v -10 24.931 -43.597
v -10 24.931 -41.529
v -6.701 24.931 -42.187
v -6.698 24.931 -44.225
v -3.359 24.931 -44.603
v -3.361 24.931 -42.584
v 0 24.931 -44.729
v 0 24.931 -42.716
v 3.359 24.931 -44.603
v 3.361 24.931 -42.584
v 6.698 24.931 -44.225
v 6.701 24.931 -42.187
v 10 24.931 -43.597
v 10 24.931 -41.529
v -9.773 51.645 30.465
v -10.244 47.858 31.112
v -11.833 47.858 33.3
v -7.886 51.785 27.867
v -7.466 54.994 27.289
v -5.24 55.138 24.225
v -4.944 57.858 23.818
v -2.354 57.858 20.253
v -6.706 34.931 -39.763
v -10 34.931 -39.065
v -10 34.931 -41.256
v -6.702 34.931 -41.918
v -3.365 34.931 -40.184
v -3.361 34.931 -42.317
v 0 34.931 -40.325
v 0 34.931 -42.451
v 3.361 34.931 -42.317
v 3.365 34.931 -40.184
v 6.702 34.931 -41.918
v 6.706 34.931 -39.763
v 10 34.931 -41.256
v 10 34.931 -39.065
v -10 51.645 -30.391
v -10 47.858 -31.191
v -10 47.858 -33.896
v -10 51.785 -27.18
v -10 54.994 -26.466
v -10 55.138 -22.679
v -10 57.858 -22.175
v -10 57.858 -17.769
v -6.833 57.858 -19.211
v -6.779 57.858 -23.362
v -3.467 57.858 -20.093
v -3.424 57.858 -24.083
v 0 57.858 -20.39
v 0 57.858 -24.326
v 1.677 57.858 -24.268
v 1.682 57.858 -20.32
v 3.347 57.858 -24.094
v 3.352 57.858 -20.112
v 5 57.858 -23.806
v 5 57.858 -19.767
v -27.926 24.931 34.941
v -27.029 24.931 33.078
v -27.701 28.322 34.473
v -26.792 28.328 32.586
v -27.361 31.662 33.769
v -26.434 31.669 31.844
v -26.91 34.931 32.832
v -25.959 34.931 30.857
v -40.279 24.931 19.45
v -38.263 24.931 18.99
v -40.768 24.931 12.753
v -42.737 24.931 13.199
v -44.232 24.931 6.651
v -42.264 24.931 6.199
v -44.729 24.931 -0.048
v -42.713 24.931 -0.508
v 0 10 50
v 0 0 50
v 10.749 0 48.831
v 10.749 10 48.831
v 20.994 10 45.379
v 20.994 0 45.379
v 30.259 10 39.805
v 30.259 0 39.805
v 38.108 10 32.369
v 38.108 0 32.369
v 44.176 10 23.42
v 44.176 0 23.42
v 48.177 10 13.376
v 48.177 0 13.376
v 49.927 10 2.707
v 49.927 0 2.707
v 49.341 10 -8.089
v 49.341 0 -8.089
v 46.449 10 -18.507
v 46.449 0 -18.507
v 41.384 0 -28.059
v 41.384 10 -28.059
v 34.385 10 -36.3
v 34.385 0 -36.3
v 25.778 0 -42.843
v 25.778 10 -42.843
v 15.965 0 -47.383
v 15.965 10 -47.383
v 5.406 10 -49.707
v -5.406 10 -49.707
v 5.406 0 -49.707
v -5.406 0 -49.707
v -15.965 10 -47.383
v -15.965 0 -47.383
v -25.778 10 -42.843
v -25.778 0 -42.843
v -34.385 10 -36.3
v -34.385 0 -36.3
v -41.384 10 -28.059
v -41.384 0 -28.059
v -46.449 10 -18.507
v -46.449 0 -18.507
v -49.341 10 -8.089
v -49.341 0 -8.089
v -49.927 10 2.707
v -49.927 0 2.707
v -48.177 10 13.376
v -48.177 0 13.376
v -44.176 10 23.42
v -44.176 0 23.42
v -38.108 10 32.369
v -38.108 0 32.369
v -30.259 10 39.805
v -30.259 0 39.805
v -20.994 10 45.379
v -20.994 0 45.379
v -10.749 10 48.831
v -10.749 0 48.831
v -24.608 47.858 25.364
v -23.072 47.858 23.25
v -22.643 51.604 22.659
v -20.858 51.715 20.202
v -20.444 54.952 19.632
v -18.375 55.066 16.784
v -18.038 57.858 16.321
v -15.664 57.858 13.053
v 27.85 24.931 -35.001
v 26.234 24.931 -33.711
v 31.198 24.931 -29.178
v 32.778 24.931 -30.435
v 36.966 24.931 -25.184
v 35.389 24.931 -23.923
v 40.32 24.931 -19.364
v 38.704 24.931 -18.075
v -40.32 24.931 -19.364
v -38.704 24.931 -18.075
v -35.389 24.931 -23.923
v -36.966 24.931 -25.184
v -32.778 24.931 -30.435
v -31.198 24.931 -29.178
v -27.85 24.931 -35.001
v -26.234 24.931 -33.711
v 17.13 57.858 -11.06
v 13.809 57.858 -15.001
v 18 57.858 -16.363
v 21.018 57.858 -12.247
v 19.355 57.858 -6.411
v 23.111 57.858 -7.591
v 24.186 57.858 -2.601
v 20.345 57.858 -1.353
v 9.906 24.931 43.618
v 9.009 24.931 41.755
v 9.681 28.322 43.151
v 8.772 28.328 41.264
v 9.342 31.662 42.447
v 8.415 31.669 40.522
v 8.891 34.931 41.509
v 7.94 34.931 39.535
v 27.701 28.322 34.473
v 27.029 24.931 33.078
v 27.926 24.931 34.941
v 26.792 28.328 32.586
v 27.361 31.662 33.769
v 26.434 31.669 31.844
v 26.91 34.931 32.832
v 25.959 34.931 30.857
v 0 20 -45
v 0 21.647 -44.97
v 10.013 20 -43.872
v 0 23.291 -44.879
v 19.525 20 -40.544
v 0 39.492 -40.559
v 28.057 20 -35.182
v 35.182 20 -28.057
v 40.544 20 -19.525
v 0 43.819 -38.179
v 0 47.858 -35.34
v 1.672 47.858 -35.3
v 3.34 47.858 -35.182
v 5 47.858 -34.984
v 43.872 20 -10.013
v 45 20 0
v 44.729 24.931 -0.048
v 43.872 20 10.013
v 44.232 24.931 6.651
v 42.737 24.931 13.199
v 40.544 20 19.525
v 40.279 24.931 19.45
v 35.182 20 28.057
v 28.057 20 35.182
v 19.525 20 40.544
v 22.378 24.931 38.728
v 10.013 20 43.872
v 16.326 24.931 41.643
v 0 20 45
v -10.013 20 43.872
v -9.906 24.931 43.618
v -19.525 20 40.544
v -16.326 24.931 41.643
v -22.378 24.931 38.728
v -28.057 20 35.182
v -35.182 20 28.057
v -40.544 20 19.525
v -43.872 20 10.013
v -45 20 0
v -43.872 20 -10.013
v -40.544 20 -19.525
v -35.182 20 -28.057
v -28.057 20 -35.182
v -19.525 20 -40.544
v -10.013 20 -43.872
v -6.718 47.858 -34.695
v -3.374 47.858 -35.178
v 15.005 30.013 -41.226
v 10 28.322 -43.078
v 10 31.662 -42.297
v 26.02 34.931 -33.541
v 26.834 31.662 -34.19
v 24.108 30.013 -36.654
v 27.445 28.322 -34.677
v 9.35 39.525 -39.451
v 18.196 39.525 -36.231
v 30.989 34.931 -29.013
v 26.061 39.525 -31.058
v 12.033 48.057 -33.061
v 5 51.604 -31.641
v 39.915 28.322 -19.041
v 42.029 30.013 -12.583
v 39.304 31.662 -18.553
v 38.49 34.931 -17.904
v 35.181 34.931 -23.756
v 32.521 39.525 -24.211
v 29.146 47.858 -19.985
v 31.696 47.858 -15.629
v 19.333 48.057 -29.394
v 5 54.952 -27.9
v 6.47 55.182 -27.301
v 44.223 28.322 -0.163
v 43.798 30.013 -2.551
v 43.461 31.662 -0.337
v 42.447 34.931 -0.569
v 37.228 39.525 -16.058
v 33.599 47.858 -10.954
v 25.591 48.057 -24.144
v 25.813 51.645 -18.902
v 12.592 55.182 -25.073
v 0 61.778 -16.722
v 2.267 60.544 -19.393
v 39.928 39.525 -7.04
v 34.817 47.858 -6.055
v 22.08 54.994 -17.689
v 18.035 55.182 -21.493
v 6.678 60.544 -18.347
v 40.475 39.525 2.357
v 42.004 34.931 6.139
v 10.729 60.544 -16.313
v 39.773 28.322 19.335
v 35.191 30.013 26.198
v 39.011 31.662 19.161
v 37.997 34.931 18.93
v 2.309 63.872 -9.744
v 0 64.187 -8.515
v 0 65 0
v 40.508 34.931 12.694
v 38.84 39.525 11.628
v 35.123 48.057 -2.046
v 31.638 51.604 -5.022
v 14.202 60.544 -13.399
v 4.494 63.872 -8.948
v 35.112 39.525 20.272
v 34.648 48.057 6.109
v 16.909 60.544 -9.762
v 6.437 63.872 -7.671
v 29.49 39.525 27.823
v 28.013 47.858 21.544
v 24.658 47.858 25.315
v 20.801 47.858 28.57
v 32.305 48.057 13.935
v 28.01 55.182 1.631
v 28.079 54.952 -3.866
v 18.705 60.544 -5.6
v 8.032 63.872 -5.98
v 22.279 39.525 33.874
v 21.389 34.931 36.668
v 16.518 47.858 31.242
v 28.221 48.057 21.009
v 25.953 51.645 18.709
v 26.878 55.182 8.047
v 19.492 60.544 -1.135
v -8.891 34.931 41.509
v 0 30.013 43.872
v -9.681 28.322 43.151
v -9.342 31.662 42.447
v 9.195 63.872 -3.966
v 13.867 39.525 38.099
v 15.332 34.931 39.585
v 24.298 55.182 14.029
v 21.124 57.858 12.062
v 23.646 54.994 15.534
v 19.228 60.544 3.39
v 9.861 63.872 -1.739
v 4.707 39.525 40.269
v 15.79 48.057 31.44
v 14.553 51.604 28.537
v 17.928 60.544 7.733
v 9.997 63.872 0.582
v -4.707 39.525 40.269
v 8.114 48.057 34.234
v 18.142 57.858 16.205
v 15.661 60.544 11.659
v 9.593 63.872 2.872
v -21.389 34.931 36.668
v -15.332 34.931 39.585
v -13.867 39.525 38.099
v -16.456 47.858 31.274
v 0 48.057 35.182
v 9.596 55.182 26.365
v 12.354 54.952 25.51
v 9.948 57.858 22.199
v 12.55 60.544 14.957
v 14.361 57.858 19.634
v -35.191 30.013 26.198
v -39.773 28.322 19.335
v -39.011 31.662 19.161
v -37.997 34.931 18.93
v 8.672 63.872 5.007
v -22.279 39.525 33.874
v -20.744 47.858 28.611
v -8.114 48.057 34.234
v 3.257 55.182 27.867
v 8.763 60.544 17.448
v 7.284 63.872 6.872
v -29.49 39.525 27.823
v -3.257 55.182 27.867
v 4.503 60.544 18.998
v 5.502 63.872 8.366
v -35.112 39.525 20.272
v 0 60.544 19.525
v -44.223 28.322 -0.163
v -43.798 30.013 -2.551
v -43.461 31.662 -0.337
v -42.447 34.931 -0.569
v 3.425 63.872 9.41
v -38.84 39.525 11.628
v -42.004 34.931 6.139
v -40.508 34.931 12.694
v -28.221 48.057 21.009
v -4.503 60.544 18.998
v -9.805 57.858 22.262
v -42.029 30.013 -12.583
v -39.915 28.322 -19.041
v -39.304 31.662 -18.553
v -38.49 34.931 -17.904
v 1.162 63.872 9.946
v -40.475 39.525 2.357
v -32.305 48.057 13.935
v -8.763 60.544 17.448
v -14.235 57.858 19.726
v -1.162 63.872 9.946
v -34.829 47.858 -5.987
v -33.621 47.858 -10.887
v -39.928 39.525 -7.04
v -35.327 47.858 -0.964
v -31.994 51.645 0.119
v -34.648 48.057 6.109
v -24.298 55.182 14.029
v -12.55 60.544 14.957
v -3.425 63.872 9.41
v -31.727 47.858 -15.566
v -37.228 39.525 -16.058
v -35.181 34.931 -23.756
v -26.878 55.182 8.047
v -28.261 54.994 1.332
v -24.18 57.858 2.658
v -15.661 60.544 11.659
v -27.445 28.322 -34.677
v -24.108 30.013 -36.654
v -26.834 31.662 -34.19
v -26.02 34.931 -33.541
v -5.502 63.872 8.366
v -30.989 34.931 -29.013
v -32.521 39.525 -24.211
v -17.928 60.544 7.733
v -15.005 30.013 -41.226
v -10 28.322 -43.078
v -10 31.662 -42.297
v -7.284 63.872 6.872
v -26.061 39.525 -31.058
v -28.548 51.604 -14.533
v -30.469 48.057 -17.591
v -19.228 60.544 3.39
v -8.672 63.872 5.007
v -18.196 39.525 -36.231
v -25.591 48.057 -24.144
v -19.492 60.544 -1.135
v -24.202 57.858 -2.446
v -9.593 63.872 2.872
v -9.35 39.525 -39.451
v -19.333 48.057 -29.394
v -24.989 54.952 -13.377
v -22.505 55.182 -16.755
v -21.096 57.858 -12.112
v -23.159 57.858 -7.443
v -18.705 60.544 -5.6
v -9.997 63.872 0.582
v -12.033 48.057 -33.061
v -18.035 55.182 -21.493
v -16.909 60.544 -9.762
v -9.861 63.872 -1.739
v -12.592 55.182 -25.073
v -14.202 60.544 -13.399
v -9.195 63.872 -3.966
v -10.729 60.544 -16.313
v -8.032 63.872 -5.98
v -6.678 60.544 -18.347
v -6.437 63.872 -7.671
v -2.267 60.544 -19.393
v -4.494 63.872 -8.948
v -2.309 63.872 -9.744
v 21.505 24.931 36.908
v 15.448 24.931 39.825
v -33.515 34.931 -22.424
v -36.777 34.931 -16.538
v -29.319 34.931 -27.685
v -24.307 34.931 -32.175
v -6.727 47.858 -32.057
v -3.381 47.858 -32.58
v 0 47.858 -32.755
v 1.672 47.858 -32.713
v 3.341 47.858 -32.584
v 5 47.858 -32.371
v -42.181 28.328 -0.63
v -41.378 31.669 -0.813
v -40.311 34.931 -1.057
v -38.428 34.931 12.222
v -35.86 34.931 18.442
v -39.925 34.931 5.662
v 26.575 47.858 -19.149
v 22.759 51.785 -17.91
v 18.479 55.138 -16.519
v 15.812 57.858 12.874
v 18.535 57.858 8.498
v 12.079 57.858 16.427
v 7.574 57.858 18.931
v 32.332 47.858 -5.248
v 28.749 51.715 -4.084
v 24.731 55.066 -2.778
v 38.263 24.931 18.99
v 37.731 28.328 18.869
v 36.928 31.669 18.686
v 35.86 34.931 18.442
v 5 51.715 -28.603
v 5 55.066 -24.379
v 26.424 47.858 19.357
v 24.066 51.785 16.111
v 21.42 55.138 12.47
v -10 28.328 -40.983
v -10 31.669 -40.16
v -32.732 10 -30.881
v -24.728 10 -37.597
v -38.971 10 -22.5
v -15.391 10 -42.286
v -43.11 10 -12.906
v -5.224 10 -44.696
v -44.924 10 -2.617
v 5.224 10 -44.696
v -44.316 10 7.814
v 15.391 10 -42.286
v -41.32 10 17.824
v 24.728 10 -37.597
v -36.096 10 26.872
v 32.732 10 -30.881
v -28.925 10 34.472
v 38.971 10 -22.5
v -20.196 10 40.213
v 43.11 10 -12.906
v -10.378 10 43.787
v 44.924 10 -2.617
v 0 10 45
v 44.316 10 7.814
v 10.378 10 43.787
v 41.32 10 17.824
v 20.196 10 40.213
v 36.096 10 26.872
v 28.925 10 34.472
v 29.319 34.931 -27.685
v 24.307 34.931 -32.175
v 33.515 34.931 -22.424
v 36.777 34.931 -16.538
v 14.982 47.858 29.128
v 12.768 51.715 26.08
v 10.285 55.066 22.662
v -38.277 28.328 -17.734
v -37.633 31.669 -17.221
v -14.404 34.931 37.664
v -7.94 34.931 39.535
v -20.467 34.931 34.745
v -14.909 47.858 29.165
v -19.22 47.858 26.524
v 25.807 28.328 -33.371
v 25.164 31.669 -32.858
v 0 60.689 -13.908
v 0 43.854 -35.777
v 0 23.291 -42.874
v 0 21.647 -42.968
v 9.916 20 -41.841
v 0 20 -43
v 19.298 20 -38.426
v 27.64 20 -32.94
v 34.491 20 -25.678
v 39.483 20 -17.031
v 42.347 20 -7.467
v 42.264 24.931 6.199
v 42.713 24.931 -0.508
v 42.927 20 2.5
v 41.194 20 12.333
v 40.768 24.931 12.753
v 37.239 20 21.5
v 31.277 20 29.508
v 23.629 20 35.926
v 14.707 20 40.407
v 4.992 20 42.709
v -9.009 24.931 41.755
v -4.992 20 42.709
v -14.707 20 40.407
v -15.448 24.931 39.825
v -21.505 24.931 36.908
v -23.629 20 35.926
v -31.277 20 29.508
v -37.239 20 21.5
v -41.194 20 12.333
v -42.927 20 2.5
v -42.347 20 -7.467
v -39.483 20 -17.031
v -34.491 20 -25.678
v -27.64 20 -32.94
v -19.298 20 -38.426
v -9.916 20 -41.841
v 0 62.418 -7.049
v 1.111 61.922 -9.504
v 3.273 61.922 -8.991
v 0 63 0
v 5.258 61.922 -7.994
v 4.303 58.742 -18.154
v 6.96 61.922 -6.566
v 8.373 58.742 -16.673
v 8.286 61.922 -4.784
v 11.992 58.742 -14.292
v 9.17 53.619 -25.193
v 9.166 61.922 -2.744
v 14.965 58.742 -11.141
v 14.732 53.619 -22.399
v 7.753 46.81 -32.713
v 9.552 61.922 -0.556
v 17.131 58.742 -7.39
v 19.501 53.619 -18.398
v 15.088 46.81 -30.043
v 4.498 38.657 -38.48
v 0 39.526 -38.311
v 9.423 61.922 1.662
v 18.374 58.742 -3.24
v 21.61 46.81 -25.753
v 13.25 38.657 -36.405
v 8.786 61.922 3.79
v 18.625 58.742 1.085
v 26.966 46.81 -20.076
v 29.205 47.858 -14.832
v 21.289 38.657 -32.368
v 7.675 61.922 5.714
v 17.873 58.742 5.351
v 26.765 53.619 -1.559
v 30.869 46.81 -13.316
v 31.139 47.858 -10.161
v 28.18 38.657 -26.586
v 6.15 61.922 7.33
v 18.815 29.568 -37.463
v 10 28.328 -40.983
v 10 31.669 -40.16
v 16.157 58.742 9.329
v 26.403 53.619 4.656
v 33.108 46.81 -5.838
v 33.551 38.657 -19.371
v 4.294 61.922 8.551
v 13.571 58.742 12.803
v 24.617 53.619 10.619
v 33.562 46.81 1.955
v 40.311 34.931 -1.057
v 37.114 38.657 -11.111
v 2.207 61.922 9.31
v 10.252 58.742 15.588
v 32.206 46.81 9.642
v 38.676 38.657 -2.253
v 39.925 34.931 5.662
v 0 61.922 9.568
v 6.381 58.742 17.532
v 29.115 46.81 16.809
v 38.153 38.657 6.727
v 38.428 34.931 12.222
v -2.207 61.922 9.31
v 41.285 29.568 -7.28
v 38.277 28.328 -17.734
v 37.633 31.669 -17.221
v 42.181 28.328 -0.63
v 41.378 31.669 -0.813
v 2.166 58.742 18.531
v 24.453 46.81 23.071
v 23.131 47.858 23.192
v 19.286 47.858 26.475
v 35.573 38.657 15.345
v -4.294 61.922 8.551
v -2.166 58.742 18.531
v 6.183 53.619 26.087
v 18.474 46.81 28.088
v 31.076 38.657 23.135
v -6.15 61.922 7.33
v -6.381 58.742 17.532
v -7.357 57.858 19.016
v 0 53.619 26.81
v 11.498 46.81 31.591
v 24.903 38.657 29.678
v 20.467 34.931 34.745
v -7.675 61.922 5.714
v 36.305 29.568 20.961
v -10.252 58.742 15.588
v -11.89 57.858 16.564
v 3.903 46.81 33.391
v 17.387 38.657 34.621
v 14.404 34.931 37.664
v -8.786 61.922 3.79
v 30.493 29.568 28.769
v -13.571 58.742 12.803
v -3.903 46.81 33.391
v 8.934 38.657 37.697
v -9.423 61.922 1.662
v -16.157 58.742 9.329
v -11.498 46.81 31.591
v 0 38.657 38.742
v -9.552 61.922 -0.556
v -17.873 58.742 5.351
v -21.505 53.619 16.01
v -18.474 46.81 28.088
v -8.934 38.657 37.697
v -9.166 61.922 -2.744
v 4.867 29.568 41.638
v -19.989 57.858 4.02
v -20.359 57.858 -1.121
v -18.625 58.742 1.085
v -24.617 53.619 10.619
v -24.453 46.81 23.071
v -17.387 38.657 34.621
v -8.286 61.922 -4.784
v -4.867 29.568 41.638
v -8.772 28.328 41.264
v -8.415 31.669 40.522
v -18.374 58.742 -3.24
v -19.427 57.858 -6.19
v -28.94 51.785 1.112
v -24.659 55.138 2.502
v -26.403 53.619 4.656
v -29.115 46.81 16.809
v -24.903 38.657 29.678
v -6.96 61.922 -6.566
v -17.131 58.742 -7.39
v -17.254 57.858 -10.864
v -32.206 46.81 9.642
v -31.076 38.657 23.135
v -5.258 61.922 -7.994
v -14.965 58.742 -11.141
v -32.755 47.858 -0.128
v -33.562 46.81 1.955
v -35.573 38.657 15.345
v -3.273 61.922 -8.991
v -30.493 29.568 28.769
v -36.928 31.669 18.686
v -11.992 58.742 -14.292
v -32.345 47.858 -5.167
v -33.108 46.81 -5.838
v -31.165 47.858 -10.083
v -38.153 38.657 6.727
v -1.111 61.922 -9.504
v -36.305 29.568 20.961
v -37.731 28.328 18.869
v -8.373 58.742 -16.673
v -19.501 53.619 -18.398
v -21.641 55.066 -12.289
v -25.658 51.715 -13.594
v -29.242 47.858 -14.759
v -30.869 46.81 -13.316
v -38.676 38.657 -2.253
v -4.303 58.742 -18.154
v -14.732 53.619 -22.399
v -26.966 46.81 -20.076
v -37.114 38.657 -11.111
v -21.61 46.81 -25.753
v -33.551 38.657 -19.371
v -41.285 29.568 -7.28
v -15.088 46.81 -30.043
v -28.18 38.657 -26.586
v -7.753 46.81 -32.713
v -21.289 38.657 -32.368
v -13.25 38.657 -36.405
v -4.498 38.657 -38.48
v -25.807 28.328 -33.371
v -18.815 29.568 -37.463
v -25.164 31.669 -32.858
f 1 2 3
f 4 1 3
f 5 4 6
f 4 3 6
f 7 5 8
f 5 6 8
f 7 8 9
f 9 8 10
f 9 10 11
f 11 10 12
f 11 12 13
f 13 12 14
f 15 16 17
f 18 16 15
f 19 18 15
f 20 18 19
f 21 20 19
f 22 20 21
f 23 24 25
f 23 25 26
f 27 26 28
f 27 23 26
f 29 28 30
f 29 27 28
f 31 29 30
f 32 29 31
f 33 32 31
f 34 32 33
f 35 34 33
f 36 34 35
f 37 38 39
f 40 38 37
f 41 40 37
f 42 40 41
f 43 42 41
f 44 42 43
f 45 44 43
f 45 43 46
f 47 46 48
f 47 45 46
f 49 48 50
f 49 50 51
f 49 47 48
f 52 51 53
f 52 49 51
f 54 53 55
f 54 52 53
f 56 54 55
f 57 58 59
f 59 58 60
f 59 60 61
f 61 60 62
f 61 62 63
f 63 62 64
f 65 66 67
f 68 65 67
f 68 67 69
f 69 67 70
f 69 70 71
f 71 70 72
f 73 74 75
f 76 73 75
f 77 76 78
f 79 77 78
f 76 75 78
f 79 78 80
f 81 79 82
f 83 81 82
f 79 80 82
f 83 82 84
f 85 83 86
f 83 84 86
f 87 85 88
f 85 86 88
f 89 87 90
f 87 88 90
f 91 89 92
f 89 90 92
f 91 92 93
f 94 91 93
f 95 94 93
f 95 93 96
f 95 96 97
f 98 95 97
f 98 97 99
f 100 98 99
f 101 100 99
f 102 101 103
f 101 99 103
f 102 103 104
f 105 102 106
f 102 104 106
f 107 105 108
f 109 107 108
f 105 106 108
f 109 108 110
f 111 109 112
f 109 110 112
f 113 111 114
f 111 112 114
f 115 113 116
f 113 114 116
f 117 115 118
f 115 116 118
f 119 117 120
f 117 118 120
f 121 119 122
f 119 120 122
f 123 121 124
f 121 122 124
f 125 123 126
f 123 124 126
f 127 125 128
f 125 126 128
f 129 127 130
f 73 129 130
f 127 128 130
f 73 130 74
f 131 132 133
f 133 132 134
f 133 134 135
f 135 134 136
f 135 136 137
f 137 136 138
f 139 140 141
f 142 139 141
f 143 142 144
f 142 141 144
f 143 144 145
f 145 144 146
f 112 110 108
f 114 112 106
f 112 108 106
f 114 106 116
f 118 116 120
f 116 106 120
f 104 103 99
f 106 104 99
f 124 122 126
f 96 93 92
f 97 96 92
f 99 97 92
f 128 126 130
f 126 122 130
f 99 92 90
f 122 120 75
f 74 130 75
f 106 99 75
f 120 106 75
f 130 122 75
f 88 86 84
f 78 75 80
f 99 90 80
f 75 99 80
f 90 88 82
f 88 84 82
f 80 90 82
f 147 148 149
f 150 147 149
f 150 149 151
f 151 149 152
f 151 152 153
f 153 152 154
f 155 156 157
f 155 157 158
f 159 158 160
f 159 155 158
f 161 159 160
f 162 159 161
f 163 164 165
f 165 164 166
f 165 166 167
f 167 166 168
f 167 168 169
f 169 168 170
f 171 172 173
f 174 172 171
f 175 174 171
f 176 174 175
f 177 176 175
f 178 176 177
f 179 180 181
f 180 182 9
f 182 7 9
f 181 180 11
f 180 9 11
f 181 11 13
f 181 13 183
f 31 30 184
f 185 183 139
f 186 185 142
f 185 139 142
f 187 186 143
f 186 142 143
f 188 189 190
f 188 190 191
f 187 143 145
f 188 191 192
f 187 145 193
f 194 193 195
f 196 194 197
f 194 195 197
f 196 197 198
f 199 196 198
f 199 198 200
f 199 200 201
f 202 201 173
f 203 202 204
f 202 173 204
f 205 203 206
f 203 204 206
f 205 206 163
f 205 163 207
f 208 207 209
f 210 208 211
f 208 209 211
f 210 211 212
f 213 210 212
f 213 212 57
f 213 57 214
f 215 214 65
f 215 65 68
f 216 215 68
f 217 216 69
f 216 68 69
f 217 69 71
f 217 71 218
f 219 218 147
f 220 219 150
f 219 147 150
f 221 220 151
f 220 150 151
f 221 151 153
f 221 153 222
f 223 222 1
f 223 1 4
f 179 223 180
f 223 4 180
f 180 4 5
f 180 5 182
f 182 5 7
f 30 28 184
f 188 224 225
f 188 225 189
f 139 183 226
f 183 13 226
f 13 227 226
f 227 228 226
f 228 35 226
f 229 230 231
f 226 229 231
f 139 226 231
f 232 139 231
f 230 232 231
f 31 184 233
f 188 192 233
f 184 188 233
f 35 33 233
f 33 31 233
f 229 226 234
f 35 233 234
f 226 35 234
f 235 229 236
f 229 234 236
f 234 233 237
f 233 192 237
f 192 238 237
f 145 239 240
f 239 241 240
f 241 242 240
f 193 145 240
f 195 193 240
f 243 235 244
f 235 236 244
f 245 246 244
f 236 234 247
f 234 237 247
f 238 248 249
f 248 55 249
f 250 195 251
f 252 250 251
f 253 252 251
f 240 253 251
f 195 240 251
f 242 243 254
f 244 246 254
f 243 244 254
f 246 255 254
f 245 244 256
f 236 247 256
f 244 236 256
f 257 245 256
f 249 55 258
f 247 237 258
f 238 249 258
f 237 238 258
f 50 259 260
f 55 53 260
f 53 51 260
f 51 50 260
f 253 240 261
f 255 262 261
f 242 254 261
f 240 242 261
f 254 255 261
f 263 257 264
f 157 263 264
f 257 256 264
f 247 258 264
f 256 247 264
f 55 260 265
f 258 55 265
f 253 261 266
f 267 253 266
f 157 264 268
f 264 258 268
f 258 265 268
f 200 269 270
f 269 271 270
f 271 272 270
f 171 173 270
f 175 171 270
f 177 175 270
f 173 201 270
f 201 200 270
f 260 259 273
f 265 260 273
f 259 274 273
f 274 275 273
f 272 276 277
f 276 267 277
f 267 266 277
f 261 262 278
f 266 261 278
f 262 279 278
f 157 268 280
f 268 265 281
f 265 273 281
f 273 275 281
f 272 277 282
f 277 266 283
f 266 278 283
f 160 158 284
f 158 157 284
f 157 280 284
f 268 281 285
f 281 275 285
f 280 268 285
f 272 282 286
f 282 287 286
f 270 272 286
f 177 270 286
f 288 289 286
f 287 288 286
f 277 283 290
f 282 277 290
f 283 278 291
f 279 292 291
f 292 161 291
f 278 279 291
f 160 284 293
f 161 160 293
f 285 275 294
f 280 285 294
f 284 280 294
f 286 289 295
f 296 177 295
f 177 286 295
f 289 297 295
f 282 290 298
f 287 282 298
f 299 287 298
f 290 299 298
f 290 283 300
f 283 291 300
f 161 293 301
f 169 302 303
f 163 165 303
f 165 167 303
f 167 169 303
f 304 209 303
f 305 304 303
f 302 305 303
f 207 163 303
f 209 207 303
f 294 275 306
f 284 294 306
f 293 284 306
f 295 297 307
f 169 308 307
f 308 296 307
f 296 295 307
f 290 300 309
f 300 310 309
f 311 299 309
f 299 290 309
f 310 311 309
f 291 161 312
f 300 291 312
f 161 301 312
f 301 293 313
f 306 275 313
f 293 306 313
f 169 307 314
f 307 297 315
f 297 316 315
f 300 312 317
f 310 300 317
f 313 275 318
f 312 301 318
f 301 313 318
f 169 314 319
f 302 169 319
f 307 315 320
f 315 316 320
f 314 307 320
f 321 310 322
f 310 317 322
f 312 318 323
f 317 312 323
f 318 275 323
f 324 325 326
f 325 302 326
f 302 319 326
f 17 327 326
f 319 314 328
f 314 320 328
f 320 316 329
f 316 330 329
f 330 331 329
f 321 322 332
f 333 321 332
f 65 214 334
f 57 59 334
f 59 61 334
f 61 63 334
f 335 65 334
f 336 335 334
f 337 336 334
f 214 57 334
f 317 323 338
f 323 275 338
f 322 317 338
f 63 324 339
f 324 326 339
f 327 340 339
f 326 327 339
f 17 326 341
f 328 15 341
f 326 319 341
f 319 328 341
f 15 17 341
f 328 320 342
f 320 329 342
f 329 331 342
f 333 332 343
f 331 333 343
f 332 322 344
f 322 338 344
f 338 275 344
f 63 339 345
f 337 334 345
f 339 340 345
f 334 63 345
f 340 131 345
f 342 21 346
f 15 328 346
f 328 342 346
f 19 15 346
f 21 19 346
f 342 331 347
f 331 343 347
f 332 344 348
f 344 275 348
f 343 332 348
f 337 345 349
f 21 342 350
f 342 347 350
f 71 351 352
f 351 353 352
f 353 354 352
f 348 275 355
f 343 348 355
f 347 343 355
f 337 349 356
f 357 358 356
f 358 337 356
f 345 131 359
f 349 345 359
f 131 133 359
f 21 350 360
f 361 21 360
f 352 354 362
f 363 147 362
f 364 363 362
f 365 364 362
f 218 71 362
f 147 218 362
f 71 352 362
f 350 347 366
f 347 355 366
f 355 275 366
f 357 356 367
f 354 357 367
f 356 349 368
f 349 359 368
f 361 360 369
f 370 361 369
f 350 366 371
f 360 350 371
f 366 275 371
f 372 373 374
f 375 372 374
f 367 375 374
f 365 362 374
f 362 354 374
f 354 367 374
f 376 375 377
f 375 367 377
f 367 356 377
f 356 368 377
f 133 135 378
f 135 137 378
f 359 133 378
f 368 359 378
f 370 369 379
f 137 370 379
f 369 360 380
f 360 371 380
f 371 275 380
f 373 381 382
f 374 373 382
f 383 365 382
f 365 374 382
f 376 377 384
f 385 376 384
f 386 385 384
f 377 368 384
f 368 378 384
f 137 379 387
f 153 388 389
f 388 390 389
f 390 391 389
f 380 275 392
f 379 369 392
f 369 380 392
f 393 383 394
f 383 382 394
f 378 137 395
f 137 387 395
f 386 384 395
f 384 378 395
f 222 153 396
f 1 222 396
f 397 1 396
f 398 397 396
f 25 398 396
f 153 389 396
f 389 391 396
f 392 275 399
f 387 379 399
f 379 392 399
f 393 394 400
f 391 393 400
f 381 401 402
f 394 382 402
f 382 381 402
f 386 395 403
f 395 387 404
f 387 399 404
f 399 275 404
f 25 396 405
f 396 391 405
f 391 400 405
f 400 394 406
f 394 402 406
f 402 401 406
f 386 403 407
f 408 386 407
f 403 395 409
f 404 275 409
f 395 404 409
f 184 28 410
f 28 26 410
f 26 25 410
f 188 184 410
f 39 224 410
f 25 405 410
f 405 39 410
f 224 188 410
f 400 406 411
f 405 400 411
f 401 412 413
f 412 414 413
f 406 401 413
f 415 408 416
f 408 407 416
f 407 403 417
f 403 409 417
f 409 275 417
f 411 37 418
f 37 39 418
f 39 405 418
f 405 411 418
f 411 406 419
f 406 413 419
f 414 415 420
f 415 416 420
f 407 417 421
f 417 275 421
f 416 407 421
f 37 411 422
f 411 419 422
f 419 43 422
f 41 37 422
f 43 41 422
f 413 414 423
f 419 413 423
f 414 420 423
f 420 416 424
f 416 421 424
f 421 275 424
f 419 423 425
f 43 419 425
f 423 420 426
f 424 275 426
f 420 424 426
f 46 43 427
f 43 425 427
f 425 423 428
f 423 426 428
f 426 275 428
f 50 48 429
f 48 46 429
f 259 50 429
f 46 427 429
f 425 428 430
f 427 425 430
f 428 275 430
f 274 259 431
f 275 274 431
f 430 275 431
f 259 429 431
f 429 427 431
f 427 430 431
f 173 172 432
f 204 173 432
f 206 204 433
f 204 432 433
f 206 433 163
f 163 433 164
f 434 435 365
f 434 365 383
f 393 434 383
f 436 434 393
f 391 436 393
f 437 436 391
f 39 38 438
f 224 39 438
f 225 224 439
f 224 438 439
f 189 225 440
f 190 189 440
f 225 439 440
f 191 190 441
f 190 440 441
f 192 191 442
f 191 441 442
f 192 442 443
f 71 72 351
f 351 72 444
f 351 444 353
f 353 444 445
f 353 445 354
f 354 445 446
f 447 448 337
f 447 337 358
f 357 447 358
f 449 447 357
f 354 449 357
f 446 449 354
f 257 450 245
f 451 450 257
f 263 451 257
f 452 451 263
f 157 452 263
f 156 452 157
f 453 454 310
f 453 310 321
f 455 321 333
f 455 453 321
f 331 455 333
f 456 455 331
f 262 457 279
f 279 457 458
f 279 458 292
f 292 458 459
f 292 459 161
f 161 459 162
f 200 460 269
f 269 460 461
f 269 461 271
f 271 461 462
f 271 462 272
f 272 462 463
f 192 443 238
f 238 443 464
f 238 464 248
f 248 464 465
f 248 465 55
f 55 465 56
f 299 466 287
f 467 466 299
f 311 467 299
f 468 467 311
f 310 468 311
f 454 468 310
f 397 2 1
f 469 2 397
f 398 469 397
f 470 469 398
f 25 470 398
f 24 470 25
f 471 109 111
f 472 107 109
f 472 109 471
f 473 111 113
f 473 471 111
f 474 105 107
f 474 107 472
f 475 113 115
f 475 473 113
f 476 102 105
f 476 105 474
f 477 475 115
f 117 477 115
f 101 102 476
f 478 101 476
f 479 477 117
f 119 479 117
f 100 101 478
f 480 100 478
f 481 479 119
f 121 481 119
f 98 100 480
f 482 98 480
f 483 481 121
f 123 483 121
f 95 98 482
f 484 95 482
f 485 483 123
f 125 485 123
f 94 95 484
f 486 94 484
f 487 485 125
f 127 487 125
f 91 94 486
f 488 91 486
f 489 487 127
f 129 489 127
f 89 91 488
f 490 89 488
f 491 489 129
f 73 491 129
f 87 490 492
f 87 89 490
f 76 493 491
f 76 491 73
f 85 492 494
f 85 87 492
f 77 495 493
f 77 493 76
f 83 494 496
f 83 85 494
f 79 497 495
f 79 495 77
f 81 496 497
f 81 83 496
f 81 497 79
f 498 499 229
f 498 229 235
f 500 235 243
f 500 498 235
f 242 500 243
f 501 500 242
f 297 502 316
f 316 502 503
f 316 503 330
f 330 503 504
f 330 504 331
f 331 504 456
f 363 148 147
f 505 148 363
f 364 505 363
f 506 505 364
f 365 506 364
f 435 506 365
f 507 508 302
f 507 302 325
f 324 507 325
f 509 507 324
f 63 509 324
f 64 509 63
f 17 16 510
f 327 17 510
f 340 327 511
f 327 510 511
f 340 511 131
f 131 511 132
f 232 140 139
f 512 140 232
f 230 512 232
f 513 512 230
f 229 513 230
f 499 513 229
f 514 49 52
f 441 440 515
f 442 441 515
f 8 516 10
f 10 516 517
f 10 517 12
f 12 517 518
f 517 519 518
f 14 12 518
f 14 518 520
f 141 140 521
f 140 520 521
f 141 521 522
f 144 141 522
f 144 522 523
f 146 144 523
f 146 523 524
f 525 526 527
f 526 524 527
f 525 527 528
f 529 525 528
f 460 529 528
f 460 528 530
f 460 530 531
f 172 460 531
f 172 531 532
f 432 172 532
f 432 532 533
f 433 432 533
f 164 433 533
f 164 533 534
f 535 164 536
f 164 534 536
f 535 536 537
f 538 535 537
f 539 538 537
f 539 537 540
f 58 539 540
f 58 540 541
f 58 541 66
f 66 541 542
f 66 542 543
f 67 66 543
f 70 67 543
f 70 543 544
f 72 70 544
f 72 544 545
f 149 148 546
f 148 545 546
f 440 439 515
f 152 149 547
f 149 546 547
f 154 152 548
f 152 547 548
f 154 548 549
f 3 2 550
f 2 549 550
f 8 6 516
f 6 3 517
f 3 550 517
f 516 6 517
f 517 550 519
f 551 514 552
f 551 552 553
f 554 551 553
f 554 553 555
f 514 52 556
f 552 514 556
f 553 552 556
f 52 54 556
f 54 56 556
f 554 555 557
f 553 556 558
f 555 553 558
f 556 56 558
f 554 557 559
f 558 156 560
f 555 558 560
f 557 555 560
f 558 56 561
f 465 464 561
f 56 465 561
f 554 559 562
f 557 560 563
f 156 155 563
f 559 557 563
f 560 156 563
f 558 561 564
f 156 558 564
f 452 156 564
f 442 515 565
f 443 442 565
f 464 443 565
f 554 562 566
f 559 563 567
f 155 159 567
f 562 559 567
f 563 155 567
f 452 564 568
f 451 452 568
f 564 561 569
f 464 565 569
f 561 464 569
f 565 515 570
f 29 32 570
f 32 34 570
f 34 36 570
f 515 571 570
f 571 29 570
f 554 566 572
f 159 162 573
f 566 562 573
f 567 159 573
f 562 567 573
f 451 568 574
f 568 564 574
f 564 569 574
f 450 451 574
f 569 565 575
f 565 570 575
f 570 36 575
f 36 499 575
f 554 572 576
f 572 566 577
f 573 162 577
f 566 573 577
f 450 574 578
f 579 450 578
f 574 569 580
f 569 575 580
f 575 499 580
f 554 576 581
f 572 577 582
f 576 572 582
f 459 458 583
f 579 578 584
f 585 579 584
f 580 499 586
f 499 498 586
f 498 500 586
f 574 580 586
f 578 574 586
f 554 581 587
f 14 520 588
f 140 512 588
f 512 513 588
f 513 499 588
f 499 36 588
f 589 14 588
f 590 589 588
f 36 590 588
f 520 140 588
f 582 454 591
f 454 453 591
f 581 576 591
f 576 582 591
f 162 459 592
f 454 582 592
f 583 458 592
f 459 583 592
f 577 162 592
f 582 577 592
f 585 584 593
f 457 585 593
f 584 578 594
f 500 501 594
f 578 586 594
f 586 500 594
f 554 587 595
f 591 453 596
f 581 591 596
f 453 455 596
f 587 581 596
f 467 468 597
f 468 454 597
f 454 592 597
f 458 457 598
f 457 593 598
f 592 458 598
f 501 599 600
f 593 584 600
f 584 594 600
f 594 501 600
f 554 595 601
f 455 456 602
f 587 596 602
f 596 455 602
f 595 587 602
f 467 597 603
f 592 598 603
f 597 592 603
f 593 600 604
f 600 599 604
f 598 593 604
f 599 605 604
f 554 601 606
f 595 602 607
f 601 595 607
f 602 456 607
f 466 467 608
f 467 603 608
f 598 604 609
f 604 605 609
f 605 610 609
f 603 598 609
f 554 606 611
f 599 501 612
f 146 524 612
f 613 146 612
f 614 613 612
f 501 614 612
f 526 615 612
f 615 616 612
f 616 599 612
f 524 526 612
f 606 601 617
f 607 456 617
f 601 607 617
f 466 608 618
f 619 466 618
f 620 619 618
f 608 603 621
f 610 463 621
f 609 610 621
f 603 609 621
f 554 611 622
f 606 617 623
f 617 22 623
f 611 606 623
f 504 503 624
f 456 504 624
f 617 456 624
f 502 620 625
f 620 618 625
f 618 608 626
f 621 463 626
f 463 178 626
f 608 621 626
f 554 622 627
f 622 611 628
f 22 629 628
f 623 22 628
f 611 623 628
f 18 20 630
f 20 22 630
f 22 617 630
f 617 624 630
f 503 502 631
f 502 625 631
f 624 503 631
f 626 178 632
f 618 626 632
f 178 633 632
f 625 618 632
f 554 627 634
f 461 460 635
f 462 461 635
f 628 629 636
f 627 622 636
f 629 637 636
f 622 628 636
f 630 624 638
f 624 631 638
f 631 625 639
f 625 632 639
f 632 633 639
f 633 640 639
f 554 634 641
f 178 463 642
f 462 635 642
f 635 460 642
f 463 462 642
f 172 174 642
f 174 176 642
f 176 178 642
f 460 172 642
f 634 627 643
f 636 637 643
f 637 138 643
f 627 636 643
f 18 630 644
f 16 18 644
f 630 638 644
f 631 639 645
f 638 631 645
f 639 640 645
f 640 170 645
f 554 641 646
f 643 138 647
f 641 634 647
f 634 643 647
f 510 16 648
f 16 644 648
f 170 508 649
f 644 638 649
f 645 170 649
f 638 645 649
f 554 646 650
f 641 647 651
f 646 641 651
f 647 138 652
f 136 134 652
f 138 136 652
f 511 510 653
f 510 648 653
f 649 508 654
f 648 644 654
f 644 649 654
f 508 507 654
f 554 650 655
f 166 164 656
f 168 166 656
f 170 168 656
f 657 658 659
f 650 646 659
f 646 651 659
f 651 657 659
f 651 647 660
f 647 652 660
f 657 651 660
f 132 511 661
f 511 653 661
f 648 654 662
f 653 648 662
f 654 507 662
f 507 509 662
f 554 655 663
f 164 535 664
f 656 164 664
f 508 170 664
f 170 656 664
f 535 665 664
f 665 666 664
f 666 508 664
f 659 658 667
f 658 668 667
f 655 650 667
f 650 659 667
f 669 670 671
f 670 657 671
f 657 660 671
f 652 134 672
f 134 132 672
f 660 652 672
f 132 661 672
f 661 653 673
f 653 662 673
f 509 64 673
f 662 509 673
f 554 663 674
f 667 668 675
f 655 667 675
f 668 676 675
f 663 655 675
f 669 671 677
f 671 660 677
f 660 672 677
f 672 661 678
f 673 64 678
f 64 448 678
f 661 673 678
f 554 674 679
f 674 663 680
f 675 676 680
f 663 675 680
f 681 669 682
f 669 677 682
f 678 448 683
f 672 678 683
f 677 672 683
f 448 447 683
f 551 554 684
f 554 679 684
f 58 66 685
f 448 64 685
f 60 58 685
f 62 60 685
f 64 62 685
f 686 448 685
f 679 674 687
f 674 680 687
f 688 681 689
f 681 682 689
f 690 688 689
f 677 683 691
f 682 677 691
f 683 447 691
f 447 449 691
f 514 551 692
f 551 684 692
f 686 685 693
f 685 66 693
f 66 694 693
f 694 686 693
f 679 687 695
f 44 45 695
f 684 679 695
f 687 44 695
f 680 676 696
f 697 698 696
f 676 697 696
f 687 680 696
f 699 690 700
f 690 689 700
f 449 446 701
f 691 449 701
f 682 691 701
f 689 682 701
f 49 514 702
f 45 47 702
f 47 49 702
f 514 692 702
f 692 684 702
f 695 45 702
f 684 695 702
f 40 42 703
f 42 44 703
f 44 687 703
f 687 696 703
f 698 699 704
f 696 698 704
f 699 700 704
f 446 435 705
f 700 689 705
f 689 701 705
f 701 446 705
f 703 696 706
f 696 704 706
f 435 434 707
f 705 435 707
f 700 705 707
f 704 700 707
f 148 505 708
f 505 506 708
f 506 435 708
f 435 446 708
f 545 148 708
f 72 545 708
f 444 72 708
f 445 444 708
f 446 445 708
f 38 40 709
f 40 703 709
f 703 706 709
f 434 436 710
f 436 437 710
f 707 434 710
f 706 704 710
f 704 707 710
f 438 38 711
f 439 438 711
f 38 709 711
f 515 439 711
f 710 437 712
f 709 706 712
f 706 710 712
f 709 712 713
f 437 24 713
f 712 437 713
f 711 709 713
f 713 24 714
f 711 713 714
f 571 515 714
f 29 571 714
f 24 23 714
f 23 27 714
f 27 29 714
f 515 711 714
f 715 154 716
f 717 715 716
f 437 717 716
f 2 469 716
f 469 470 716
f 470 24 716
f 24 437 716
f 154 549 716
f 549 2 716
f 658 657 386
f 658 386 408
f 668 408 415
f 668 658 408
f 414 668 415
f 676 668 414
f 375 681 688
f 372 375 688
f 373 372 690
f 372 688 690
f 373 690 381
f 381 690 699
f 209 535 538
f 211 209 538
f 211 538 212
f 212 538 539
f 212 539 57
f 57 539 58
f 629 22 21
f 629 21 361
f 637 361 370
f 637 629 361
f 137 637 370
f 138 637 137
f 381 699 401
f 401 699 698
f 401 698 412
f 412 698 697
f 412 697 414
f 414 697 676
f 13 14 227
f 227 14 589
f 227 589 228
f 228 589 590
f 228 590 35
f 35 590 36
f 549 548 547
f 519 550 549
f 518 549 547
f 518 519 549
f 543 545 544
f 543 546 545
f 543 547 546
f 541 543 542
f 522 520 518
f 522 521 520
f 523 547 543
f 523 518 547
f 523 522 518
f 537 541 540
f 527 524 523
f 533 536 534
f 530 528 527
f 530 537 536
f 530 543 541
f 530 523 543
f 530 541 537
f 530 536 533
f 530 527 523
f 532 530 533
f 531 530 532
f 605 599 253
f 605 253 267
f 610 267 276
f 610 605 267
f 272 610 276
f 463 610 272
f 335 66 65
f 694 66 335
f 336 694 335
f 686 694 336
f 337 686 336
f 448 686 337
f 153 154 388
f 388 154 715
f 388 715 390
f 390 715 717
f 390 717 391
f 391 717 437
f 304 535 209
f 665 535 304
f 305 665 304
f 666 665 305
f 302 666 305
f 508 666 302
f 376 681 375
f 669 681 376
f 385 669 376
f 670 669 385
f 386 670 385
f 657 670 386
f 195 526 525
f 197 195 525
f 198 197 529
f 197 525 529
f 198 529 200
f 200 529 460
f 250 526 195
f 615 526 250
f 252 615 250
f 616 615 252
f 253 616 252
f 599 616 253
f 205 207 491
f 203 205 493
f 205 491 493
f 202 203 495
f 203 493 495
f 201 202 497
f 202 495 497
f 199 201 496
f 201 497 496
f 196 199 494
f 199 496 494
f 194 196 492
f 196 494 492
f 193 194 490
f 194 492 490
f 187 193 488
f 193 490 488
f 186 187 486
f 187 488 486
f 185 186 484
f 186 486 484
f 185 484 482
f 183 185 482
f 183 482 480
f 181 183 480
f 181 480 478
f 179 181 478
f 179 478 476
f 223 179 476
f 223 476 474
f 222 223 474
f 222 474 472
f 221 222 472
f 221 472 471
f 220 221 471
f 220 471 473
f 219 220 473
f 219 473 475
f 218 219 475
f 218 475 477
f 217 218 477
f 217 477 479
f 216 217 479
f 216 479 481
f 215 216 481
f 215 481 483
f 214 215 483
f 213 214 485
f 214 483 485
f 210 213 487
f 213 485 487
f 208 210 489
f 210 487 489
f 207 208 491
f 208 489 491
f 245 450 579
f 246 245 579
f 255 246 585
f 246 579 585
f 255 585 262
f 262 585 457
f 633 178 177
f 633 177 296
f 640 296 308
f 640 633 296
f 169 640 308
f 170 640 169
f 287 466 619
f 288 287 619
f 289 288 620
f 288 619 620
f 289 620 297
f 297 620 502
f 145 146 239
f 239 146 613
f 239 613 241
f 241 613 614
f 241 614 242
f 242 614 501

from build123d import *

# Parameters (mm, degrees)
SCHIZZO1_R                   = 50
ESTRUSIONE_ESTRUSIONE1_DEPTH = 10
SCHIZZO2_R                   = 45
ESTRUSIONE_ESTRUSIONE2_DEPTH = 10
SCHIZZO14_W                  = 20
SCHIZZO14_H                  = 10
TAGLIO_ESTRUSIONE2_DEPTH     = 53
RIPETIZIONECIRCOLARE6_COUNT  = 7
SCHIZZO17_W                  = 15
SCHIZZO17_H                  = 10
TAGLIO_ESTRUSIONE3_DEPTH     = 53
RIPETIZIONECIRCOLARE7_COUNT  = 5


with BuildPart() as part:
    # Schizzo1 → Estrusione-Estrusione1 (new body)
    with BuildSketch(Plane(origin=(0, 0, 0), x_dir=(1, 0, 0), z_dir=(0, 1, 0))):
        with Locations(Location((0, 0, 0), (0, 0, 270))):
            Circle(SCHIZZO1_R)
    extrude(amount=ESTRUSIONE_ESTRUSIONE1_DEPTH)

    # Schizzo2 → Estrusione-Estrusione2 (add)
    with BuildSketch(Plane(origin=(0, 10, 0), x_dir=(1, 0, 0), z_dir=(0, 1, 0))):
        with Locations(Location((0, 0, 0), (0, 0, 270))):
            Circle(SCHIZZO2_R)
    extrude(amount=ESTRUSIONE_ESTRUSIONE2_DEPTH)

    # Schizzo6 → Rivoluzione9 (revolve)
    with BuildSketch(Plane(origin=(0, 0, 0), x_dir=(0, 0, -1), z_dir=(1, 0, 0)), mode=Mode.PRIVATE) as rivoluzione9_sk:
        with BuildLine():
            Line((0, 65), (0, 63))
            ThreePointArc((0, 63), (-30.405591591, 50.405591591), (-43, 20))
            Line((-43, 20), (-45, 20))
            ThreePointArc((-45, 20), (-31.819805153, 51.819805153), (0, 65))
        make_face()
    revolve(rivoluzione9_sk.sketch.rotate(Axis((0, 119.686269666, 0), (0, -1, 0)), 180), axis=Axis((0, 119.686269666, 0), (0, -1, 0)))

    # Schizzo14 → Taglio-Estrusione2 (cut)
    with BuildSketch(Plane.XY):
        with Locations((0, 29.930993036)):
            Rectangle(SCHIZZO14_W, SCHIZZO14_H)
    taglio_estrusione2 = extrude(amount=-TAGLIO_ESTRUSIONE2_DEPTH, mode=Mode.SUBTRACT)

    # RipetizioneCircolare6: Taglio-Estrusione2 ×7 about axis
    ripetizionecircolare6_axis = Axis((0, 0, 0), (0, 1, 0))
    for i in range(1, RIPETIZIONECIRCOLARE6_COUNT):
        add(taglio_estrusione2.rotate(ripetizionecircolare6_axis, i * 360 / RIPETIZIONECIRCOLARE6_COUNT), mode=Mode.SUBTRACT)

    # Schizzo17 → Taglio-Estrusione3 (cut)
    with BuildSketch(Plane.XY):
        with Locations((-2.5, 52.858470441)):
            Rectangle(SCHIZZO17_W, SCHIZZO17_H)
    taglio_estrusione3 = extrude(amount=-TAGLIO_ESTRUSIONE3_DEPTH, mode=Mode.SUBTRACT)

    # RipetizioneCircolare7: Taglio-Estrusione3 ×5 about axis
    ripetizionecircolare7_axis = Axis((0, 0, 0), (0, 1, 0))
    for i in range(1, RIPETIZIONECIRCOLARE7_COUNT):
        add(taglio_estrusione3.rotate(ripetizionecircolare7_axis, i * 360 / RIPETIZIONECIRCOLARE7_COUNT), mode=Mode.SUBTRACT)


solid = part.part
